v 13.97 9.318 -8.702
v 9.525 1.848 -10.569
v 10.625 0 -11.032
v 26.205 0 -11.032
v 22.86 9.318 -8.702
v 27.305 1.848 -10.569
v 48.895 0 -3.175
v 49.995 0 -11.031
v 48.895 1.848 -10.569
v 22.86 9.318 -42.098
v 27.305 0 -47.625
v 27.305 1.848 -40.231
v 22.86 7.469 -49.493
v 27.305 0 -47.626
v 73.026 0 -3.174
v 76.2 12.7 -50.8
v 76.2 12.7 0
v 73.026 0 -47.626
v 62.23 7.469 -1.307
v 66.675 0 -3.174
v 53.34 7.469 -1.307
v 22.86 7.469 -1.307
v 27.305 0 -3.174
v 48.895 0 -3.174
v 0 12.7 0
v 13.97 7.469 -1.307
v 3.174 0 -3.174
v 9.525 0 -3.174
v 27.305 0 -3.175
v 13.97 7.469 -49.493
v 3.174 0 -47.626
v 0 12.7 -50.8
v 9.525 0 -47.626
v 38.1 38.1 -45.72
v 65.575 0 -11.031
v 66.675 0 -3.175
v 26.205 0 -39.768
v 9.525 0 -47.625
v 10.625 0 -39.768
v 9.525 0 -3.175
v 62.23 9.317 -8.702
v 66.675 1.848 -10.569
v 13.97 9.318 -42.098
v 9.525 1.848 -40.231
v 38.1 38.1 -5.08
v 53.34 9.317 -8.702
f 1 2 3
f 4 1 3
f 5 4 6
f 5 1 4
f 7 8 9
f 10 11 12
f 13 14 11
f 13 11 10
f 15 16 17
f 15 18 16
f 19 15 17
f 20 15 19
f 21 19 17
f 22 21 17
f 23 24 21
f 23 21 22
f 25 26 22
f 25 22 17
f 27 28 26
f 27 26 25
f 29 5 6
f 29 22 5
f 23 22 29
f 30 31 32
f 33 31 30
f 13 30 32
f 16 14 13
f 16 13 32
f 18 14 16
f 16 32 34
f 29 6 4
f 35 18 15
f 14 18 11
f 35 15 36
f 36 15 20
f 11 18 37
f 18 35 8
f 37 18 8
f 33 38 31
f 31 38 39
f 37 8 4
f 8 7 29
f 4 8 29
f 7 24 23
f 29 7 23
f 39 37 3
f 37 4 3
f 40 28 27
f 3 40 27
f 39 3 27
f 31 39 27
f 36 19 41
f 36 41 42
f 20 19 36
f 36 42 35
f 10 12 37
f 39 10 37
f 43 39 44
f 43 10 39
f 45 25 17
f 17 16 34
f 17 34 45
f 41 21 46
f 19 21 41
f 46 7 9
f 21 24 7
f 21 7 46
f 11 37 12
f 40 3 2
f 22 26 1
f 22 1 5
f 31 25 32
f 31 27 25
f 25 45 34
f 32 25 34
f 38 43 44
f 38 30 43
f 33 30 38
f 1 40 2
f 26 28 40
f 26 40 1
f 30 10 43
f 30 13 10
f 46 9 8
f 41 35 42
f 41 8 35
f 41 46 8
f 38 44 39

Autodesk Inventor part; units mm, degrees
ref_plane "YZ Plane" through (0, 0, 0) normal (1, 0, 0) x (0, 1, 0)
ref_plane "XZ Plane" through (0, 0, 0) normal (0, 1, 0) x (-1, 0, 0)
ref_plane "XY Plane" through (0, 0, 0) normal (0, 0, 1) x (1, 0, 0)
sketch "Sketch1" plane through (0, 0, 0) normal (0, 1, 0) x (-1, 0, 0)
  line L0 (0, 0) -> (-76.2, 0)
  line L1 (-76.2, 0) -> (-76.2, -50.8)
  line L2 (-76.2, -50.8) -> (0, -50.8)
  line L3 (0, -50.8) -> (0, 0)
  dimension "d0" = 76.2
  dimension "d1" = 50.8
extrude "Extrusion1" add sketch "Sketch1" along normal blind 12.7
chamfer "Chamfer1" distance 12.7 distance2 3.175 1 edges at (38.1, 0, -50.8) measured on face at (50.8, 4.2333, -50.8)
chamfer "Chamfer2" distance 12.7 distance2 3.175 1 edges at (38.1, 0, 0) measured on face at (25.4, 4.2333, 0)
chamfer "Chamfer3" distance 12.7 distance2 3.175 1 edges at (76.2, 0, -25.4) measured on face at (76.2, 8.4663, -32.8085)
chamfer "Chamfer4" distance 12.7 distance2 3.175 1 edges at (0, 0, -25.4) measured on face at (0, 8.4663, -17.9915)
sketch "Sketch2" plane through (0, 12.7, 0) normal (0, 1, 0) x (1, 0, 0)
  line L0 (0, 50.8) -> (3.175, 47.625) projected
  line L1 (0, 0) -> (76.2, 0) projected
  line L2 (0, 50.8) -> (76.2, 50.8)
  line L3 (76.2, 50.8) -> (76.2, 0)
  line L4 (76.2, 0) -> (0, 0)
  line L5 (0, 0) -> (0, 50.8)
extrude "Extrusion2" add sketch "Sketch2" along normal blind 25.4
chamfer "Chamfer5" distance 5.08 distance2 25.4 1 edges at (38.1, 38.1, 0) measured on face at (25.4, 38.1, -33.8667)
chamfer "Chamfer6" distance 5.08 distance2 25.4 1 edges at (38.1, 38.1, -50.8) measured on face at (50.8, 38.1, -20.32)
chamfer "Chamfer7" distance 38.1 distance2 25.4 1 edges at (0, 38.1, -25.4) measured on face at (50.8, 38.1, -18.6267)
chamfer "Chamfer8" distance 38.1 distance2 25.4 1 edges at (76.2, 38.1, -25.4) measured on face at (50.8, 38.1, -32.1733)
sketch "Sketch6" plane through (3.175, 0, -3.175) normal (0, -0.2425, 0.9701) x (1, 0, 0)
  line L0 (0, 0) -> (69.85, 0) projected
  line L1 (0, 0) -> (15.24, 0)
  line L2 (15.24, 0) -> (24.13, 0)
  line L3 (69.85, 0) -> (69.85, -10.7807) projected
  line L4 (69.85, 0) -> (54.61, 0)
  line L5 (54.61, 0) -> (45.72, 0)
  line L6 (24.13, 0) -> (19.685, -7.699)
  line L7 (19.685, -7.699) -> (10.795, -7.699)
  line L8 (10.795, -7.699) -> (6.35, 0)
  line L9 (6.35, 0) -> (10.795, 7.699)
  line L10 (10.795, 7.699) -> (19.685, 7.699)
  line L11 (19.685, 7.699) -> (24.13, 0)
  line L12 (45.72, 0) -> (50.165, 7.699)
  line L13 (50.165, 7.699) -> (59.055, 7.699)
  line L14 (59.055, 7.699) -> (63.5, 0)
  line L15 (63.5, 0) -> (59.055, -7.699)
  line L16 (59.055, -7.699) -> (50.165, -7.699)
  line L17 (50.165, -7.699) -> (45.72, 0)
  point P0 (-3.175, 0.7701)
  dimension "d34" = 15.24
  dimension "d35" = 8.89
  dimension "d36" = 15.24
  dimension "d37" = 8.89
extrude "Extrusion3" cut sketch "Sketch6" against normal blind 7.62 contours L9 L10 L11 L0 | L0 L6 L7 L8
sketch "Sketch7" plane through (0, 12.7, 0) normal (0, -0.2425, 0.9701) x (1, 0, 0)
  line L0 (27.305, -13.0909) -> (73.025, -13.0909) projected
  line L1 (73.025, -13.0909) -> (57.785, -13.0909)
  line L2 (57.785, -13.0909) -> (48.895, -13.0909)
  line L3 (48.895, -13.0909) -> (53.34, -5.3919)
  line L4 (53.34, -5.3919) -> (62.23, -5.3919)
  line L5 (62.23, -5.3919) -> (66.675, -13.0909)
  line L6 (66.675, -13.0909) -> (62.23, -20.7898)
  line L7 (62.23, -20.7898) -> (53.34, -20.7898)
  line L8 (53.34, -20.7898) -> (48.895, -13.0909)
  point P0 (0, -12.3208)
  dimension "d40" = 15.24
  dimension "d41" = 8.89
extrude "Extrusion4" cut sketch "Sketch7" against normal blind 7.62
sketch "Sketch8" plane through (73.025, 0, -47.625) normal (0, -0.2425, -0.9701) x (-1, 0, 0)
  line L0 (69.85, 0) -> (69.85, -10.7807) projected
  line L1 (69.85, 0) -> (54.61, 0)
  line L2 (0, 0) -> (69.85, 0) projected
  line L3 (54.61, 0) -> (45.72, 0)
  line L4 (45.72, 0) -> (50.165, 7.699)
  line L5 (50.165, 7.699) -> (59.055, 7.699)
  line L6 (59.055, 7.699) -> (63.5, 0)
  line L7 (63.5, 0) -> (59.055, -7.699)
  line L8 (59.055, -7.699) -> (50.165, -7.699)
  line L9 (50.165, -7.699) -> (45.72, 0)
  point P0 (73.025, -11.5508)
  dimension "d44" = 15.24
  dimension "d45" = 8.89
extrude "Extrusion5" cut sketch "Sketch8" against normal blind 7.62
properties part number "tesla v1"
